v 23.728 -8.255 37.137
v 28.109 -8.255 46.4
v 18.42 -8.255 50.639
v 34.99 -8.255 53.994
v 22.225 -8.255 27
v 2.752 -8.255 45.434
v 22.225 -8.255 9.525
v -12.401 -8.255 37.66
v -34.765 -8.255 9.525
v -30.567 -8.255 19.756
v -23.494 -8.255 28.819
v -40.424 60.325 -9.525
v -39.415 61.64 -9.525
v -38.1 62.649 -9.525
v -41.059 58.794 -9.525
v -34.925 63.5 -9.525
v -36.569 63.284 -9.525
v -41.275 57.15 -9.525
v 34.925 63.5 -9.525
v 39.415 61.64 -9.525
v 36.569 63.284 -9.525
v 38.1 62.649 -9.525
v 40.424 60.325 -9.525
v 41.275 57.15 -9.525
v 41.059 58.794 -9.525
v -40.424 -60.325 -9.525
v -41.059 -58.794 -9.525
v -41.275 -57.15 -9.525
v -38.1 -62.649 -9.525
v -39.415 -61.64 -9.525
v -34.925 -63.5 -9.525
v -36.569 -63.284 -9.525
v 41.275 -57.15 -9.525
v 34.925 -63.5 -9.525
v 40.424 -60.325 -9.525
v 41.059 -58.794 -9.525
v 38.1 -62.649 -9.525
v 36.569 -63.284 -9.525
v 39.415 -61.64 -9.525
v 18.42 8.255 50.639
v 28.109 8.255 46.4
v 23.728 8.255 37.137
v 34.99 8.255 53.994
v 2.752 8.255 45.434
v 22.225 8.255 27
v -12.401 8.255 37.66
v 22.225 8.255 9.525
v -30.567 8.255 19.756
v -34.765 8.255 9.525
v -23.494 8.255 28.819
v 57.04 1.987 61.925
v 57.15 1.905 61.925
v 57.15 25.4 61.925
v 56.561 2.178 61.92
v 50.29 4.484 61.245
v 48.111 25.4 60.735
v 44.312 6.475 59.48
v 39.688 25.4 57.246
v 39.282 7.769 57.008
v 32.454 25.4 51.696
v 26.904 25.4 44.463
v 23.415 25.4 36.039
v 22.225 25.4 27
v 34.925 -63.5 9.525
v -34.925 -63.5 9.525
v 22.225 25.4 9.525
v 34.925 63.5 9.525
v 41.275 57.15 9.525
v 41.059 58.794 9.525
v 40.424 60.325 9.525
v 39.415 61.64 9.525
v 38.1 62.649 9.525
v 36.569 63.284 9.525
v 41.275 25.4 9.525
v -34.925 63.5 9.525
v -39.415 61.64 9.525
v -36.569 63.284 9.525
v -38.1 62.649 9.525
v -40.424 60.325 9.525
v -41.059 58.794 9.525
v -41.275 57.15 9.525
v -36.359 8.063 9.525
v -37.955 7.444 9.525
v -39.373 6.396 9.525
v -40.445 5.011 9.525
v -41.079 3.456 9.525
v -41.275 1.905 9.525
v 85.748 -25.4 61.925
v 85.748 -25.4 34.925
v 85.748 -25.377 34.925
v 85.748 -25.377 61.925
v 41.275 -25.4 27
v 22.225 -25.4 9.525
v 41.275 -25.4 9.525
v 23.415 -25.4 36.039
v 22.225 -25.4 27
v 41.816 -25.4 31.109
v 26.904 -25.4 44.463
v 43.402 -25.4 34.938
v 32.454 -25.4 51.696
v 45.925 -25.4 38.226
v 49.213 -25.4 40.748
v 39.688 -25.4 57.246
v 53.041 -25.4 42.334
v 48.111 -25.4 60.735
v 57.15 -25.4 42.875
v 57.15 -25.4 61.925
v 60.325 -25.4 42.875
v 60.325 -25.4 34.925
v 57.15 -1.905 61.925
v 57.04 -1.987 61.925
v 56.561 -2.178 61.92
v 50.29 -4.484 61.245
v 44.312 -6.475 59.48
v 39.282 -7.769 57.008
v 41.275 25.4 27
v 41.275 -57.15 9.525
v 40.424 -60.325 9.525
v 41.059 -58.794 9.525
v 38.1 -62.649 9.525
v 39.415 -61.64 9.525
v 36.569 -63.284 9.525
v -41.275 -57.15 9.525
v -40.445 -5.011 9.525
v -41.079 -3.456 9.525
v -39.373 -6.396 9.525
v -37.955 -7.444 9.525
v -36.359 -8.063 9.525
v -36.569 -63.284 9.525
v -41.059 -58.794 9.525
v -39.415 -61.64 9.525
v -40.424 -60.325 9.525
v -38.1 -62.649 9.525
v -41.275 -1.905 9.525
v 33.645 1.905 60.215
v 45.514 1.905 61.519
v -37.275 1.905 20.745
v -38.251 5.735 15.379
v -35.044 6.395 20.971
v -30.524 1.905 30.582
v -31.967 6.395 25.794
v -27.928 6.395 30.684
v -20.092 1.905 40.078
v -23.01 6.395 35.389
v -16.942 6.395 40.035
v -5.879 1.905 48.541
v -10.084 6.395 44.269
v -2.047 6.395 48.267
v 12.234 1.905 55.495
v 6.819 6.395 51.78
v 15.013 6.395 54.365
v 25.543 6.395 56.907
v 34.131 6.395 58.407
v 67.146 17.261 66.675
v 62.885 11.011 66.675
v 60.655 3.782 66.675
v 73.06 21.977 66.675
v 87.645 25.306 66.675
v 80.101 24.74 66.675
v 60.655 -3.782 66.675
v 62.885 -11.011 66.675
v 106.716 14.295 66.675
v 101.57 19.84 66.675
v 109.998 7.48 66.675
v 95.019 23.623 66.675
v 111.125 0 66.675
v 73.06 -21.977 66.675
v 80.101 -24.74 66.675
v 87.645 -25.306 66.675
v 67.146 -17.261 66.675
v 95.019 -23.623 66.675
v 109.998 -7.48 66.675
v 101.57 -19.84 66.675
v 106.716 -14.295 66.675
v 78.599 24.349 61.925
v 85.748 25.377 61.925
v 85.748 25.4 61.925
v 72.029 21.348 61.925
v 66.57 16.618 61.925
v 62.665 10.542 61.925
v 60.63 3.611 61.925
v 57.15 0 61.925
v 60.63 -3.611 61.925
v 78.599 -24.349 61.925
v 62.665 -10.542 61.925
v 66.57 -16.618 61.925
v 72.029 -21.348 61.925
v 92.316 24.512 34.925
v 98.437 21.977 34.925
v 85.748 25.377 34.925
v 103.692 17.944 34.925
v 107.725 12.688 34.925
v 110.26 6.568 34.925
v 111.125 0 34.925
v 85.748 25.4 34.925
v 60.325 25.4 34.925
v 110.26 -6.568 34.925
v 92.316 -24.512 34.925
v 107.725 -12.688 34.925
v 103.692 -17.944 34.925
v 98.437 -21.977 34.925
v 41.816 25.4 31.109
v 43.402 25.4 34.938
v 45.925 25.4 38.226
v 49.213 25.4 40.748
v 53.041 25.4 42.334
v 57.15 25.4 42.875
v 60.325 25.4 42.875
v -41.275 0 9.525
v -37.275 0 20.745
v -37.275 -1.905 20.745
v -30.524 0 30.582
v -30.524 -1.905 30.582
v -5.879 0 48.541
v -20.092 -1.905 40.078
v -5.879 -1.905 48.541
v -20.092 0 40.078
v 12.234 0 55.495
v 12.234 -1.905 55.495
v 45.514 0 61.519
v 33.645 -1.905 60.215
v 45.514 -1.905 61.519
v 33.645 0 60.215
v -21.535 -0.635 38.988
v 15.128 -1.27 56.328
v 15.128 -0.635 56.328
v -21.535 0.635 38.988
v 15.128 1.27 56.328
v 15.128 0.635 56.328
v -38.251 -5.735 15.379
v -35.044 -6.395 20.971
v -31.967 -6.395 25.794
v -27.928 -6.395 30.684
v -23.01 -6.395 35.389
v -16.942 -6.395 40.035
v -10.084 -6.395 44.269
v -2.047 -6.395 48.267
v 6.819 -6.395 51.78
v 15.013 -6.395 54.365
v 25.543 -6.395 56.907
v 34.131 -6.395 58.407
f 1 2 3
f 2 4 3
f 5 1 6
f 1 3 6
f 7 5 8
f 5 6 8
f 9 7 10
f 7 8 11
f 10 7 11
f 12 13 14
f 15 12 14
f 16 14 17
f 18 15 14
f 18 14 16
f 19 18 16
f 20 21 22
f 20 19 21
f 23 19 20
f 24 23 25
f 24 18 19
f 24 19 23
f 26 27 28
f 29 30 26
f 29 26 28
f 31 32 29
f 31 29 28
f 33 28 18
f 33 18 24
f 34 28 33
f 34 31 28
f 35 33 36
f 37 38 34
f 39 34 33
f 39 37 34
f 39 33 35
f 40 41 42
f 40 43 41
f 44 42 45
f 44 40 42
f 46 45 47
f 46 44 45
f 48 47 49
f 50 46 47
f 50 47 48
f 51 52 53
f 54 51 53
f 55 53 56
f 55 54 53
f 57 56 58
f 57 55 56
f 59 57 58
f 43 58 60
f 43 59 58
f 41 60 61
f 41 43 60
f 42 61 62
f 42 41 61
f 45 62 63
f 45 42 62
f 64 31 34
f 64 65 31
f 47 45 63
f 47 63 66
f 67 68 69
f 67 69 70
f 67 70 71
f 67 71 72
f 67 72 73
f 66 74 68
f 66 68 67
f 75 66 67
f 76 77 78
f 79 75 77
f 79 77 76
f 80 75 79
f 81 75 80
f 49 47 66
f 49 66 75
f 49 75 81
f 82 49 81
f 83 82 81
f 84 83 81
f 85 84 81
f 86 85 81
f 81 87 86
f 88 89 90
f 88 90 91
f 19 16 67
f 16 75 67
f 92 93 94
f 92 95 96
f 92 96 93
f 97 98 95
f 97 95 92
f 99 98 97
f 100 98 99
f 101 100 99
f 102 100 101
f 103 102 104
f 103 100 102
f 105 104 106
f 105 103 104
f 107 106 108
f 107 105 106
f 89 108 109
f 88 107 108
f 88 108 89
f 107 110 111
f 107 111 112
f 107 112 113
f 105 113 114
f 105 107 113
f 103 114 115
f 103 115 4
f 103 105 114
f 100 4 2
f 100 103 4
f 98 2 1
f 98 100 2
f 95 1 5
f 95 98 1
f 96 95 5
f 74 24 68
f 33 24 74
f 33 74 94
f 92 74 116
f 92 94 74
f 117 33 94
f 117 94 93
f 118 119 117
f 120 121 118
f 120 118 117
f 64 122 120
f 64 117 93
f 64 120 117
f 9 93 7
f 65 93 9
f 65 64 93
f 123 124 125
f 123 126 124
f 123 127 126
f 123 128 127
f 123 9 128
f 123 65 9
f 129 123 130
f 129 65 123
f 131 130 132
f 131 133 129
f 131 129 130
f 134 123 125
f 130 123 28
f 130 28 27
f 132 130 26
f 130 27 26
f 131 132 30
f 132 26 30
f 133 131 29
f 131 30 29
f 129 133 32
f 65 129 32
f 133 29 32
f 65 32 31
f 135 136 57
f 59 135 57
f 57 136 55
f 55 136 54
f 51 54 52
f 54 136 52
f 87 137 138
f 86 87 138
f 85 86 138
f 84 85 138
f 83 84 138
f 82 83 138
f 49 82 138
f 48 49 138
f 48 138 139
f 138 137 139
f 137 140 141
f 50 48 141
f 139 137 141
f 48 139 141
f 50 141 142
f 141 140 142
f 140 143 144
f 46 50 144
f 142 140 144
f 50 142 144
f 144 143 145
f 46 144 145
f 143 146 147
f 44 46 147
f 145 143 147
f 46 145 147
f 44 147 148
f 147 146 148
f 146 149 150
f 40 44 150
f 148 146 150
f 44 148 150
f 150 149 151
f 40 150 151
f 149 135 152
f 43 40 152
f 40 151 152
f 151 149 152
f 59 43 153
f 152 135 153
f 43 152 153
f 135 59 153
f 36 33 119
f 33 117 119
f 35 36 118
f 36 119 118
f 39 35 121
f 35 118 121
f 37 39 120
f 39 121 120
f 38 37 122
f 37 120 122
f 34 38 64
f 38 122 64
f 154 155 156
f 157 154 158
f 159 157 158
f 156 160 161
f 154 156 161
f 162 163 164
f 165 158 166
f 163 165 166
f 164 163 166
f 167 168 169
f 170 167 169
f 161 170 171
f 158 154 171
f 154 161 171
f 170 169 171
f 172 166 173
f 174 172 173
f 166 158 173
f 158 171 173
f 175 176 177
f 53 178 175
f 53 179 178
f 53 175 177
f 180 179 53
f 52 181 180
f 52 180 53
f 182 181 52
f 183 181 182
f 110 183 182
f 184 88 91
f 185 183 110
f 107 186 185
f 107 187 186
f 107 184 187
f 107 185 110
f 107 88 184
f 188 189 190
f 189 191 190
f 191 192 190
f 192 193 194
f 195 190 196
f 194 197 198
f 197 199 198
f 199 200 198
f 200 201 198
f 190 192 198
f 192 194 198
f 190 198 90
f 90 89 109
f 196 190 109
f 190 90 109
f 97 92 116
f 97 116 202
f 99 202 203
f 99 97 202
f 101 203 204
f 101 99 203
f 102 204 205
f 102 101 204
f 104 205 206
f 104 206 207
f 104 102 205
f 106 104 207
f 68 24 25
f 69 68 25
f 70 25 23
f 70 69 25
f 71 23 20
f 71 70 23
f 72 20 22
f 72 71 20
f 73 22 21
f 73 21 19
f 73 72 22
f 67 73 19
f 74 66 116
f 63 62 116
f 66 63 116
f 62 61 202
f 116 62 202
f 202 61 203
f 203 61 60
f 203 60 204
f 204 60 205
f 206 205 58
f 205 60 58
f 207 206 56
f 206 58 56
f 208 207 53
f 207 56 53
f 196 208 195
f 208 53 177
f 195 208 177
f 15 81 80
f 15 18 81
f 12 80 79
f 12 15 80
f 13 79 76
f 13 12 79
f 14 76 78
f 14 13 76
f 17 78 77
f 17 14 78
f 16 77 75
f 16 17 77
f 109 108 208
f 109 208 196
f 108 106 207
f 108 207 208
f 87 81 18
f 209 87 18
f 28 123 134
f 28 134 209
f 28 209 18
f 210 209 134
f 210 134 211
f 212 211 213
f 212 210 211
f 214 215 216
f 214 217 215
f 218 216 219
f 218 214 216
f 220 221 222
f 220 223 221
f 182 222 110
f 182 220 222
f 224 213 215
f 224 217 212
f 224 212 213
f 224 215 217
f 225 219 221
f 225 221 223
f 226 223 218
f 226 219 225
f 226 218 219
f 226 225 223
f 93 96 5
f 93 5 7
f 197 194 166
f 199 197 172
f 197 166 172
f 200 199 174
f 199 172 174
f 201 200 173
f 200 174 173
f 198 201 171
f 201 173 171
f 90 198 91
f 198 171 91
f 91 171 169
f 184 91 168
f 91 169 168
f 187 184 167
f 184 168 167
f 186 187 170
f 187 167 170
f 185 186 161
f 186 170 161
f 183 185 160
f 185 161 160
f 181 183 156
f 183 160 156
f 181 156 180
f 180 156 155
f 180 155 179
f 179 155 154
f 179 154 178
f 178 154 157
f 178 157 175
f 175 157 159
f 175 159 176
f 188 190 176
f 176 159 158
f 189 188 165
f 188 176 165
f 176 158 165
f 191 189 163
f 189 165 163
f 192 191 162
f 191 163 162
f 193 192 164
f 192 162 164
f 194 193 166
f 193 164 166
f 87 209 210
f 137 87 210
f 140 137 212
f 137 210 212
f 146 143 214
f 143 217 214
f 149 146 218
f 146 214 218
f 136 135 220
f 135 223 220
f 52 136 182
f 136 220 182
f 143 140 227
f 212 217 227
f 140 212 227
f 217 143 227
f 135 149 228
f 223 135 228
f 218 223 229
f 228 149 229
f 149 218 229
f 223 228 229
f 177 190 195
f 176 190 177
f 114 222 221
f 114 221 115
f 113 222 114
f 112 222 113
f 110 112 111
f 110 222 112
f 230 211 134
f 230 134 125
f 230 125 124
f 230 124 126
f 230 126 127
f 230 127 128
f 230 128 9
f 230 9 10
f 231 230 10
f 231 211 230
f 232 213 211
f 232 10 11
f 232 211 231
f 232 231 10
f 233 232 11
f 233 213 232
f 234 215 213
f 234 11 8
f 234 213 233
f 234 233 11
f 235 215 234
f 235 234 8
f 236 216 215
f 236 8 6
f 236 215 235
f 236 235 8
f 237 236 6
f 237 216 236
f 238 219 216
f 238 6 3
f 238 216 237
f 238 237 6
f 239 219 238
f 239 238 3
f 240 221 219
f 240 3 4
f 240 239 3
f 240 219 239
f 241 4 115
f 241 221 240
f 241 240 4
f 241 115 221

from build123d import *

# Parameters (mm, degrees)
F1_DEPTH = 63.5
F2_DEPTH = 25.4
F3_DEPTH = 8.255
F5_R     = 6.35


with BuildPart() as f1:
    # F0 (on Front) → F1 (new body, symmetric)
    with BuildSketch(Plane.XZ):
        Polygon((-41.275, -9.525), (41.275, -9.525), (41.275, 9.525), (22.225, 9.525), (-41.275, 9.525), align=None)
    extrude(amount=F1_DEPTH, both=True)

    # F0 (on Front) → F2 (join, symmetric)
    with BuildSketch(Plane.XZ):
        with BuildLine():
            Line((22.225, 9.525), (41.275, 9.525))
            Line((41.275, 9.525), (41.275, 27.0002))
            ThreePointArc((41.275, 27.0002), (45.92468, 38.22552), (57.15, 42.8752))
            Line((57.15, 42.8752), (60.325, 42.8752))
            Line((60.325, 42.8752), (60.325, 61.9252))
            Line((60.325, 61.9252), (57.15, 61.9252))
            ThreePointArc((57.15, 61.9252), (32.454296, 51.695904), (22.225, 27.0002))
            Line((22.225, 27.0002), (22.225, 9.525))
        make_face()
        Polygon((85.748255, 61.9252), (60.325, 61.9252), (60.325, 42.8752), (60.325, 34.925), (85.748255, 34.925), align=None)
    extrude(amount=F2_DEPTH, both=True)

    # F0 (on Front) → F3 (join, symmetric)
    with BuildSketch(Plane.XZ):
        with BuildLine():
            add(Edge.make_bspline(
                [(-41.275, 9.525), (-33.85127, 45.177106), (16.302885, 62.071145), (57.15, 61.9252)],
                knots=[0, 0, 0, 0, 111.504536, 111.504536, 111.504536, 111.504536], degree=3))
            Line((-41.275, 9.525), (22.225, 9.525))
            Line((22.225, 9.525), (22.225, 27.0002))
            ThreePointArc((22.225, 27.0002), (32.454296, 51.695904), (57.15, 61.9252))
        make_face()
    extrude(amount=F3_DEPTH, both=True)

    # F0 (on Front) → F4 (revolve)
    with BuildSketch(Plane.XZ):
        Polygon((85.748255, 66.675), (85.748255, 61.9252), (85.748255, 34.925), (111.125, 34.925), (111.125, 66.675), align=None)
    revolve(axis=Axis((85.748255, 0, 50.8), (0, 0, -1)))

    # F5
    f5_edges = [f1.edges().sort_by_distance(p)[0] for p in [
        (-41.275, -63.5, 0),
        (41.275, -63.5, 0),
        (41.275, 63.5, 0),
        (-41.275, 63.5, 0),
        (-1.167948, 8.255, 50.677931),
        (-1.167948, -8.255, 50.677931),
    ]]
    fillet(f5_edges, radius=F5_R)


solid = f1.part
